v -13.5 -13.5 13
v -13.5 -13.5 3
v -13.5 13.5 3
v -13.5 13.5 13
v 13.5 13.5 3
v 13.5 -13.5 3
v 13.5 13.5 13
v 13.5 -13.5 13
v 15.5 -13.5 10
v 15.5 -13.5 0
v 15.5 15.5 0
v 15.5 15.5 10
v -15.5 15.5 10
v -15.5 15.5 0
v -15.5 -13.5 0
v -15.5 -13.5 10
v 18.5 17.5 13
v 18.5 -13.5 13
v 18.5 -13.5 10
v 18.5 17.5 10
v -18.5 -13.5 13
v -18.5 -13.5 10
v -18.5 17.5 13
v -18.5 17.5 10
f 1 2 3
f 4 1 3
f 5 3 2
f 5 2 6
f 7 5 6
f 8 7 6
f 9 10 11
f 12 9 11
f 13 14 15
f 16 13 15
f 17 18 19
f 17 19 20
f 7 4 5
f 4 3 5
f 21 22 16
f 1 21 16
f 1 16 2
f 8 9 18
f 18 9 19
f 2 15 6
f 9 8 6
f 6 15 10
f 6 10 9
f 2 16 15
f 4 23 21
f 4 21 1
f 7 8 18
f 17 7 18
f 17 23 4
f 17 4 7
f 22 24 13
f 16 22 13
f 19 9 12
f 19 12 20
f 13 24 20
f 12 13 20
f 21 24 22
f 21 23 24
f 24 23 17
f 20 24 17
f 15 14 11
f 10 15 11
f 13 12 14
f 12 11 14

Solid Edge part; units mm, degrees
sketch "Sketch1" plane through (0, 0, 0) normal (0, 0, 1) x (1, 0, 0)
  line L0 (-13.5, -13.5) -> (13.5, -13.5)
  line L1 (13.5, -13.5) -> (13.5, 13.5)
  line L2 (13.5, 13.5) -> (-13.5, 13.5)
  line L3 (-13.5, 13.5) -> (-13.5, -13.5)
extrude "Protrusion1" add sketch "Sketch1" along normal blind 3
sketch "Sketch2" plane through (0, 0, 0) normal (0, 0, -1) x (1, 0, 0)
  line L0 (15.5, 13.5) -> (15.5, -15.5)
  line L1 (15.5, -15.5) -> (-15.5, -15.5)
  line L2 (-15.5, -15.5) -> (-15.5, 13.5)
  line L3 (-15.5, 13.5) -> (-13.5, 13.5)
  line L4 (-13.5, 13.5) -> (-13.5, -13.5)
  line L5 (-13.5, -13.5) -> (13.5, -13.5)
  line L6 (13.5, -13.5) -> (13.5, 13.5)
  line L7 (13.5, 13.5) -> (15.5, 13.5)
extrude "ExtrudedProtrusion_3" add sketch "Sketch2" against normal blind 13
sketch "Sketch3" plane through (0, 1, 13) normal (0, 0, 1) x (1, 0, 0)
  line L0 (13.5, -14.5) -> (26.5, -14.5)
  line L1 (26.5, -14.5) -> (26.5, 19.5)
  line L2 (26.5, 19.5) -> (-28.5, 19.5)
  line L3 (-28.5, 19.5) -> (-28.5, -14.5)
  line L4 (-28.5, -14.5) -> (-13.5, -14.5)
  line L5 (-13.5, -14.5) -> (-13.5, 12.5)
  line L6 (-13.5, 12.5) -> (13.5, 12.5)
  line L7 (13.5, 12.5) -> (13.5, -14.5)
extrude "ExtrudedProtrusion_4" add sketch "Sketch3" against normal blind 3
sketch "Sketch4" plane through (-1, 3.5, 13) normal (0, 0, 1) x (1, 0, 0)
  line L0 (-27.5, -17) -> (-27.5, 17)
  line L1 (-17.5, -17) -> (-27.5, -17)
  line L2 (-17.5, 14) -> (-17.5, -17)
  line L3 (-17.5, 14) -> (19.5, 14)
  line L4 (19.5, -17) -> (19.5, 14)
  line L5 (27.5, -17) -> (19.5, -17)
  line L6 (27.5, 17) -> (27.5, -17)
extrude "Cutout1" cut sketch "Sketch4" against normal up to next material side at (-28.45, 3.5, 13)
